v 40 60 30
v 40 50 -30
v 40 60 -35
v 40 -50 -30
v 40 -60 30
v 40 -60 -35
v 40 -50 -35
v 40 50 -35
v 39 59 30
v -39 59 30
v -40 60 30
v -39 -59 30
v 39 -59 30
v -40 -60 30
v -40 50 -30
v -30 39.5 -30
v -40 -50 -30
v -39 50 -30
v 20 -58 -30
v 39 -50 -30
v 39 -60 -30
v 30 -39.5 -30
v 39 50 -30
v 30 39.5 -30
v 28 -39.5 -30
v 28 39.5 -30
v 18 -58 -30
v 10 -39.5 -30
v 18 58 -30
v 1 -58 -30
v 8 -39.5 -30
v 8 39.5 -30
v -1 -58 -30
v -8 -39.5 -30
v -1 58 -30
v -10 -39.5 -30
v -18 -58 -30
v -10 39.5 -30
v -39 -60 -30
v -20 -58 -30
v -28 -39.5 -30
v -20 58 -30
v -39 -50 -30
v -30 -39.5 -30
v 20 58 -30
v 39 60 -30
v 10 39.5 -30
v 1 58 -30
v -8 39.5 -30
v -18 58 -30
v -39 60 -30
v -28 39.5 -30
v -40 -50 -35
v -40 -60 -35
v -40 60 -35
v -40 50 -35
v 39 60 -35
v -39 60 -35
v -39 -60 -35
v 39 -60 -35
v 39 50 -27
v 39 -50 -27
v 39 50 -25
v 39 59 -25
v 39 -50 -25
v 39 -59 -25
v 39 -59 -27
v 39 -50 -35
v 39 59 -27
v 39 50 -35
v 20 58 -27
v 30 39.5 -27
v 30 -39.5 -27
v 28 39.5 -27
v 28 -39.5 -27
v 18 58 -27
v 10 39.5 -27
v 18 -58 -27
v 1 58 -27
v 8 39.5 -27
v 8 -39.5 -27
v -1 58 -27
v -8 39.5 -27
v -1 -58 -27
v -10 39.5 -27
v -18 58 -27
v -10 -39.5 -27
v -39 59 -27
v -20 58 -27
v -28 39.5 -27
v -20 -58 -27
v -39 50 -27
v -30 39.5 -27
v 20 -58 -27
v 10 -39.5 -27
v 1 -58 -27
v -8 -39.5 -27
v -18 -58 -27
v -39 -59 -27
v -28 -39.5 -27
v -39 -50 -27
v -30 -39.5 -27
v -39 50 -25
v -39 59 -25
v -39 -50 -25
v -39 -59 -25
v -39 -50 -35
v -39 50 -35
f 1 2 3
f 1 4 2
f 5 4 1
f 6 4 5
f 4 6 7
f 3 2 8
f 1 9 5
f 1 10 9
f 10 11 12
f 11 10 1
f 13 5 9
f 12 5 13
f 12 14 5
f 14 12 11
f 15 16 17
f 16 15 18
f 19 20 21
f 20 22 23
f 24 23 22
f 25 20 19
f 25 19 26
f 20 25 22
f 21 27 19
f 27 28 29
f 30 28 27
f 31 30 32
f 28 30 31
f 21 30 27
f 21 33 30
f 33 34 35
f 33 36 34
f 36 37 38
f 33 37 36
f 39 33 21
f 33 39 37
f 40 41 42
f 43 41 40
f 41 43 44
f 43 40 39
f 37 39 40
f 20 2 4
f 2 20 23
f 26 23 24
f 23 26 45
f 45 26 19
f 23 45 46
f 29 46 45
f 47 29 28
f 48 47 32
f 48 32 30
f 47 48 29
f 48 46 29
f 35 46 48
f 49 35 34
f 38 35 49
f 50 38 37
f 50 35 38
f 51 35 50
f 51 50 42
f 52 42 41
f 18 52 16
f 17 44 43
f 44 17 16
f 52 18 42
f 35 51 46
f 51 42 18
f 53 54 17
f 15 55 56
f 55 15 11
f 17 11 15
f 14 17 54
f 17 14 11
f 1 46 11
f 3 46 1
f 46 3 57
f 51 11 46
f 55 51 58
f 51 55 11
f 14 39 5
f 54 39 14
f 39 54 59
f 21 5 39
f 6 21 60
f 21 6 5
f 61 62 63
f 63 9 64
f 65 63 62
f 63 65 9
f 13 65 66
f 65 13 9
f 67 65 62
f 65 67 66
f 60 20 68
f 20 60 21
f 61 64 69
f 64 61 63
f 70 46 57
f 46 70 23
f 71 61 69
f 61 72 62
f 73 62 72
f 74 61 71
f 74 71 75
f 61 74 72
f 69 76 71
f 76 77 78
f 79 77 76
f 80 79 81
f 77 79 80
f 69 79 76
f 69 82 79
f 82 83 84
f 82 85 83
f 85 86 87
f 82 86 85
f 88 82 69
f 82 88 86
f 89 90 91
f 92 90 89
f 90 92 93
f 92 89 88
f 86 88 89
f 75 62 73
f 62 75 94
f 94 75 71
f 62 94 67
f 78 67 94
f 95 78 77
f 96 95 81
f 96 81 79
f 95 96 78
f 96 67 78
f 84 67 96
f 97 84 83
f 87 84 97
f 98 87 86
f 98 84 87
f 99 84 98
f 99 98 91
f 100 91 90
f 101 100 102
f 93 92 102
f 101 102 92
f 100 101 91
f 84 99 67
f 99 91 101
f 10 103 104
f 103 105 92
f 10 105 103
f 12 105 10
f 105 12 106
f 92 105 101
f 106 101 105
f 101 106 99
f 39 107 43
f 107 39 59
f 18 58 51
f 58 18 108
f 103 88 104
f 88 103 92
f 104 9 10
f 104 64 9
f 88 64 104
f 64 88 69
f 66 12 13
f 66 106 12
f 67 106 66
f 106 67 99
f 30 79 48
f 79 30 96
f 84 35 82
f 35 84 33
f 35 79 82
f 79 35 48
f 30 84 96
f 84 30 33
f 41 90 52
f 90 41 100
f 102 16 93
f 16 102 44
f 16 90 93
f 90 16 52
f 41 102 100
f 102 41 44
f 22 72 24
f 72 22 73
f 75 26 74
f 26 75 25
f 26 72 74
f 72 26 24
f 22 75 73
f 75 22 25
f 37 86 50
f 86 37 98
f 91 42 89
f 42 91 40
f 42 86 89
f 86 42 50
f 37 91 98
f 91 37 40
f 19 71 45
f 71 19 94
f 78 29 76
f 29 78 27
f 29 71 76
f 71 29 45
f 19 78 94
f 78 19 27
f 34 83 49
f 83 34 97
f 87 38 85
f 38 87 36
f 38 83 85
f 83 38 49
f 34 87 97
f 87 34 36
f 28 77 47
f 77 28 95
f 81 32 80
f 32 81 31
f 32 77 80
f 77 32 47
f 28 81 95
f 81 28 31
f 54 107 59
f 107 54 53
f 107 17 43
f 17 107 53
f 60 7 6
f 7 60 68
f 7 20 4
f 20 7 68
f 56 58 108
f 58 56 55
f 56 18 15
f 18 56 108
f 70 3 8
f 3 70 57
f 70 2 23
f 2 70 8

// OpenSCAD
// file: constants.scad
width = 80;
depth = 120;
height = 60;

thickness = 2;

legWidth = thickness / 2;
legDepth = 10;
legHeight = 10;
// main file
include <constants.scad>;

module box() {
    difference() {
        difference() {
            cube([width, depth, height], center = true);
            translate([0, 0, thickness]) {
                cube([width - thickness, depth - thickness, height - thickness], center = true);
            }    
        }

        cube([thickness, depth - (thickness * 2), height], center = true);

        translate([-((width / 4) + (width / 8)  - thickness / 2), 0, 0 ]) {
            cube([thickness, (depth * 2/3) - (thickness / 2) , height], center = true);
        }

        translate([(width / 4) + (width / 8) - thickness / 2, 0, 0 ]) {
            cube([thickness, (depth * 2/3) - (thickness / 2) , height], center = true);
        }

        translate([-((width / 4) - thickness / 2), 0, 0 ]) {
            cube([thickness, depth - (thickness * 2) , height], center = true);
        }

        translate([(width / 4) - thickness / 2, 0, 0 ]) {
            cube([thickness, depth - (thickness * 2) , height], center = true);
        }

        translate([-((width / 8) - thickness / 2), 0, 0 ]) {
            cube([thickness, (depth * 2/3) - (thickness / 2) , height], center = true);
        }

        translate([(width / 8) - thickness / 2, 0, 0 ]) {
            cube([thickness, (depth * 2/3) - (thickness / 2) , height], center = true);
        }
    }

    module leg()  {
        cube([legWidth, legDepth, legHeight], center = true);
    }

    // Legs
    translate([-((width / 2) - (legWidth / 2)), -((depth / 2) - (legDepth / 2)), -(height / 2) ]) {
        leg();
    }

    translate([((width / 2) - (legWidth / 2)), -((depth / 2) - (legDepth / 2)), -(height / 2) ]) {
        leg();
    }

    translate([-((width / 2) - (legWidth / 2)), ((depth / 2) - (legDepth / 2)), -(height / 2) ]) {
        leg();
    }

    translate([((width / 2) - (legWidth / 2)), ((depth / 2) - (legDepth / 2)), -(height / 2) ]) {
        leg();
    }
}

box();
